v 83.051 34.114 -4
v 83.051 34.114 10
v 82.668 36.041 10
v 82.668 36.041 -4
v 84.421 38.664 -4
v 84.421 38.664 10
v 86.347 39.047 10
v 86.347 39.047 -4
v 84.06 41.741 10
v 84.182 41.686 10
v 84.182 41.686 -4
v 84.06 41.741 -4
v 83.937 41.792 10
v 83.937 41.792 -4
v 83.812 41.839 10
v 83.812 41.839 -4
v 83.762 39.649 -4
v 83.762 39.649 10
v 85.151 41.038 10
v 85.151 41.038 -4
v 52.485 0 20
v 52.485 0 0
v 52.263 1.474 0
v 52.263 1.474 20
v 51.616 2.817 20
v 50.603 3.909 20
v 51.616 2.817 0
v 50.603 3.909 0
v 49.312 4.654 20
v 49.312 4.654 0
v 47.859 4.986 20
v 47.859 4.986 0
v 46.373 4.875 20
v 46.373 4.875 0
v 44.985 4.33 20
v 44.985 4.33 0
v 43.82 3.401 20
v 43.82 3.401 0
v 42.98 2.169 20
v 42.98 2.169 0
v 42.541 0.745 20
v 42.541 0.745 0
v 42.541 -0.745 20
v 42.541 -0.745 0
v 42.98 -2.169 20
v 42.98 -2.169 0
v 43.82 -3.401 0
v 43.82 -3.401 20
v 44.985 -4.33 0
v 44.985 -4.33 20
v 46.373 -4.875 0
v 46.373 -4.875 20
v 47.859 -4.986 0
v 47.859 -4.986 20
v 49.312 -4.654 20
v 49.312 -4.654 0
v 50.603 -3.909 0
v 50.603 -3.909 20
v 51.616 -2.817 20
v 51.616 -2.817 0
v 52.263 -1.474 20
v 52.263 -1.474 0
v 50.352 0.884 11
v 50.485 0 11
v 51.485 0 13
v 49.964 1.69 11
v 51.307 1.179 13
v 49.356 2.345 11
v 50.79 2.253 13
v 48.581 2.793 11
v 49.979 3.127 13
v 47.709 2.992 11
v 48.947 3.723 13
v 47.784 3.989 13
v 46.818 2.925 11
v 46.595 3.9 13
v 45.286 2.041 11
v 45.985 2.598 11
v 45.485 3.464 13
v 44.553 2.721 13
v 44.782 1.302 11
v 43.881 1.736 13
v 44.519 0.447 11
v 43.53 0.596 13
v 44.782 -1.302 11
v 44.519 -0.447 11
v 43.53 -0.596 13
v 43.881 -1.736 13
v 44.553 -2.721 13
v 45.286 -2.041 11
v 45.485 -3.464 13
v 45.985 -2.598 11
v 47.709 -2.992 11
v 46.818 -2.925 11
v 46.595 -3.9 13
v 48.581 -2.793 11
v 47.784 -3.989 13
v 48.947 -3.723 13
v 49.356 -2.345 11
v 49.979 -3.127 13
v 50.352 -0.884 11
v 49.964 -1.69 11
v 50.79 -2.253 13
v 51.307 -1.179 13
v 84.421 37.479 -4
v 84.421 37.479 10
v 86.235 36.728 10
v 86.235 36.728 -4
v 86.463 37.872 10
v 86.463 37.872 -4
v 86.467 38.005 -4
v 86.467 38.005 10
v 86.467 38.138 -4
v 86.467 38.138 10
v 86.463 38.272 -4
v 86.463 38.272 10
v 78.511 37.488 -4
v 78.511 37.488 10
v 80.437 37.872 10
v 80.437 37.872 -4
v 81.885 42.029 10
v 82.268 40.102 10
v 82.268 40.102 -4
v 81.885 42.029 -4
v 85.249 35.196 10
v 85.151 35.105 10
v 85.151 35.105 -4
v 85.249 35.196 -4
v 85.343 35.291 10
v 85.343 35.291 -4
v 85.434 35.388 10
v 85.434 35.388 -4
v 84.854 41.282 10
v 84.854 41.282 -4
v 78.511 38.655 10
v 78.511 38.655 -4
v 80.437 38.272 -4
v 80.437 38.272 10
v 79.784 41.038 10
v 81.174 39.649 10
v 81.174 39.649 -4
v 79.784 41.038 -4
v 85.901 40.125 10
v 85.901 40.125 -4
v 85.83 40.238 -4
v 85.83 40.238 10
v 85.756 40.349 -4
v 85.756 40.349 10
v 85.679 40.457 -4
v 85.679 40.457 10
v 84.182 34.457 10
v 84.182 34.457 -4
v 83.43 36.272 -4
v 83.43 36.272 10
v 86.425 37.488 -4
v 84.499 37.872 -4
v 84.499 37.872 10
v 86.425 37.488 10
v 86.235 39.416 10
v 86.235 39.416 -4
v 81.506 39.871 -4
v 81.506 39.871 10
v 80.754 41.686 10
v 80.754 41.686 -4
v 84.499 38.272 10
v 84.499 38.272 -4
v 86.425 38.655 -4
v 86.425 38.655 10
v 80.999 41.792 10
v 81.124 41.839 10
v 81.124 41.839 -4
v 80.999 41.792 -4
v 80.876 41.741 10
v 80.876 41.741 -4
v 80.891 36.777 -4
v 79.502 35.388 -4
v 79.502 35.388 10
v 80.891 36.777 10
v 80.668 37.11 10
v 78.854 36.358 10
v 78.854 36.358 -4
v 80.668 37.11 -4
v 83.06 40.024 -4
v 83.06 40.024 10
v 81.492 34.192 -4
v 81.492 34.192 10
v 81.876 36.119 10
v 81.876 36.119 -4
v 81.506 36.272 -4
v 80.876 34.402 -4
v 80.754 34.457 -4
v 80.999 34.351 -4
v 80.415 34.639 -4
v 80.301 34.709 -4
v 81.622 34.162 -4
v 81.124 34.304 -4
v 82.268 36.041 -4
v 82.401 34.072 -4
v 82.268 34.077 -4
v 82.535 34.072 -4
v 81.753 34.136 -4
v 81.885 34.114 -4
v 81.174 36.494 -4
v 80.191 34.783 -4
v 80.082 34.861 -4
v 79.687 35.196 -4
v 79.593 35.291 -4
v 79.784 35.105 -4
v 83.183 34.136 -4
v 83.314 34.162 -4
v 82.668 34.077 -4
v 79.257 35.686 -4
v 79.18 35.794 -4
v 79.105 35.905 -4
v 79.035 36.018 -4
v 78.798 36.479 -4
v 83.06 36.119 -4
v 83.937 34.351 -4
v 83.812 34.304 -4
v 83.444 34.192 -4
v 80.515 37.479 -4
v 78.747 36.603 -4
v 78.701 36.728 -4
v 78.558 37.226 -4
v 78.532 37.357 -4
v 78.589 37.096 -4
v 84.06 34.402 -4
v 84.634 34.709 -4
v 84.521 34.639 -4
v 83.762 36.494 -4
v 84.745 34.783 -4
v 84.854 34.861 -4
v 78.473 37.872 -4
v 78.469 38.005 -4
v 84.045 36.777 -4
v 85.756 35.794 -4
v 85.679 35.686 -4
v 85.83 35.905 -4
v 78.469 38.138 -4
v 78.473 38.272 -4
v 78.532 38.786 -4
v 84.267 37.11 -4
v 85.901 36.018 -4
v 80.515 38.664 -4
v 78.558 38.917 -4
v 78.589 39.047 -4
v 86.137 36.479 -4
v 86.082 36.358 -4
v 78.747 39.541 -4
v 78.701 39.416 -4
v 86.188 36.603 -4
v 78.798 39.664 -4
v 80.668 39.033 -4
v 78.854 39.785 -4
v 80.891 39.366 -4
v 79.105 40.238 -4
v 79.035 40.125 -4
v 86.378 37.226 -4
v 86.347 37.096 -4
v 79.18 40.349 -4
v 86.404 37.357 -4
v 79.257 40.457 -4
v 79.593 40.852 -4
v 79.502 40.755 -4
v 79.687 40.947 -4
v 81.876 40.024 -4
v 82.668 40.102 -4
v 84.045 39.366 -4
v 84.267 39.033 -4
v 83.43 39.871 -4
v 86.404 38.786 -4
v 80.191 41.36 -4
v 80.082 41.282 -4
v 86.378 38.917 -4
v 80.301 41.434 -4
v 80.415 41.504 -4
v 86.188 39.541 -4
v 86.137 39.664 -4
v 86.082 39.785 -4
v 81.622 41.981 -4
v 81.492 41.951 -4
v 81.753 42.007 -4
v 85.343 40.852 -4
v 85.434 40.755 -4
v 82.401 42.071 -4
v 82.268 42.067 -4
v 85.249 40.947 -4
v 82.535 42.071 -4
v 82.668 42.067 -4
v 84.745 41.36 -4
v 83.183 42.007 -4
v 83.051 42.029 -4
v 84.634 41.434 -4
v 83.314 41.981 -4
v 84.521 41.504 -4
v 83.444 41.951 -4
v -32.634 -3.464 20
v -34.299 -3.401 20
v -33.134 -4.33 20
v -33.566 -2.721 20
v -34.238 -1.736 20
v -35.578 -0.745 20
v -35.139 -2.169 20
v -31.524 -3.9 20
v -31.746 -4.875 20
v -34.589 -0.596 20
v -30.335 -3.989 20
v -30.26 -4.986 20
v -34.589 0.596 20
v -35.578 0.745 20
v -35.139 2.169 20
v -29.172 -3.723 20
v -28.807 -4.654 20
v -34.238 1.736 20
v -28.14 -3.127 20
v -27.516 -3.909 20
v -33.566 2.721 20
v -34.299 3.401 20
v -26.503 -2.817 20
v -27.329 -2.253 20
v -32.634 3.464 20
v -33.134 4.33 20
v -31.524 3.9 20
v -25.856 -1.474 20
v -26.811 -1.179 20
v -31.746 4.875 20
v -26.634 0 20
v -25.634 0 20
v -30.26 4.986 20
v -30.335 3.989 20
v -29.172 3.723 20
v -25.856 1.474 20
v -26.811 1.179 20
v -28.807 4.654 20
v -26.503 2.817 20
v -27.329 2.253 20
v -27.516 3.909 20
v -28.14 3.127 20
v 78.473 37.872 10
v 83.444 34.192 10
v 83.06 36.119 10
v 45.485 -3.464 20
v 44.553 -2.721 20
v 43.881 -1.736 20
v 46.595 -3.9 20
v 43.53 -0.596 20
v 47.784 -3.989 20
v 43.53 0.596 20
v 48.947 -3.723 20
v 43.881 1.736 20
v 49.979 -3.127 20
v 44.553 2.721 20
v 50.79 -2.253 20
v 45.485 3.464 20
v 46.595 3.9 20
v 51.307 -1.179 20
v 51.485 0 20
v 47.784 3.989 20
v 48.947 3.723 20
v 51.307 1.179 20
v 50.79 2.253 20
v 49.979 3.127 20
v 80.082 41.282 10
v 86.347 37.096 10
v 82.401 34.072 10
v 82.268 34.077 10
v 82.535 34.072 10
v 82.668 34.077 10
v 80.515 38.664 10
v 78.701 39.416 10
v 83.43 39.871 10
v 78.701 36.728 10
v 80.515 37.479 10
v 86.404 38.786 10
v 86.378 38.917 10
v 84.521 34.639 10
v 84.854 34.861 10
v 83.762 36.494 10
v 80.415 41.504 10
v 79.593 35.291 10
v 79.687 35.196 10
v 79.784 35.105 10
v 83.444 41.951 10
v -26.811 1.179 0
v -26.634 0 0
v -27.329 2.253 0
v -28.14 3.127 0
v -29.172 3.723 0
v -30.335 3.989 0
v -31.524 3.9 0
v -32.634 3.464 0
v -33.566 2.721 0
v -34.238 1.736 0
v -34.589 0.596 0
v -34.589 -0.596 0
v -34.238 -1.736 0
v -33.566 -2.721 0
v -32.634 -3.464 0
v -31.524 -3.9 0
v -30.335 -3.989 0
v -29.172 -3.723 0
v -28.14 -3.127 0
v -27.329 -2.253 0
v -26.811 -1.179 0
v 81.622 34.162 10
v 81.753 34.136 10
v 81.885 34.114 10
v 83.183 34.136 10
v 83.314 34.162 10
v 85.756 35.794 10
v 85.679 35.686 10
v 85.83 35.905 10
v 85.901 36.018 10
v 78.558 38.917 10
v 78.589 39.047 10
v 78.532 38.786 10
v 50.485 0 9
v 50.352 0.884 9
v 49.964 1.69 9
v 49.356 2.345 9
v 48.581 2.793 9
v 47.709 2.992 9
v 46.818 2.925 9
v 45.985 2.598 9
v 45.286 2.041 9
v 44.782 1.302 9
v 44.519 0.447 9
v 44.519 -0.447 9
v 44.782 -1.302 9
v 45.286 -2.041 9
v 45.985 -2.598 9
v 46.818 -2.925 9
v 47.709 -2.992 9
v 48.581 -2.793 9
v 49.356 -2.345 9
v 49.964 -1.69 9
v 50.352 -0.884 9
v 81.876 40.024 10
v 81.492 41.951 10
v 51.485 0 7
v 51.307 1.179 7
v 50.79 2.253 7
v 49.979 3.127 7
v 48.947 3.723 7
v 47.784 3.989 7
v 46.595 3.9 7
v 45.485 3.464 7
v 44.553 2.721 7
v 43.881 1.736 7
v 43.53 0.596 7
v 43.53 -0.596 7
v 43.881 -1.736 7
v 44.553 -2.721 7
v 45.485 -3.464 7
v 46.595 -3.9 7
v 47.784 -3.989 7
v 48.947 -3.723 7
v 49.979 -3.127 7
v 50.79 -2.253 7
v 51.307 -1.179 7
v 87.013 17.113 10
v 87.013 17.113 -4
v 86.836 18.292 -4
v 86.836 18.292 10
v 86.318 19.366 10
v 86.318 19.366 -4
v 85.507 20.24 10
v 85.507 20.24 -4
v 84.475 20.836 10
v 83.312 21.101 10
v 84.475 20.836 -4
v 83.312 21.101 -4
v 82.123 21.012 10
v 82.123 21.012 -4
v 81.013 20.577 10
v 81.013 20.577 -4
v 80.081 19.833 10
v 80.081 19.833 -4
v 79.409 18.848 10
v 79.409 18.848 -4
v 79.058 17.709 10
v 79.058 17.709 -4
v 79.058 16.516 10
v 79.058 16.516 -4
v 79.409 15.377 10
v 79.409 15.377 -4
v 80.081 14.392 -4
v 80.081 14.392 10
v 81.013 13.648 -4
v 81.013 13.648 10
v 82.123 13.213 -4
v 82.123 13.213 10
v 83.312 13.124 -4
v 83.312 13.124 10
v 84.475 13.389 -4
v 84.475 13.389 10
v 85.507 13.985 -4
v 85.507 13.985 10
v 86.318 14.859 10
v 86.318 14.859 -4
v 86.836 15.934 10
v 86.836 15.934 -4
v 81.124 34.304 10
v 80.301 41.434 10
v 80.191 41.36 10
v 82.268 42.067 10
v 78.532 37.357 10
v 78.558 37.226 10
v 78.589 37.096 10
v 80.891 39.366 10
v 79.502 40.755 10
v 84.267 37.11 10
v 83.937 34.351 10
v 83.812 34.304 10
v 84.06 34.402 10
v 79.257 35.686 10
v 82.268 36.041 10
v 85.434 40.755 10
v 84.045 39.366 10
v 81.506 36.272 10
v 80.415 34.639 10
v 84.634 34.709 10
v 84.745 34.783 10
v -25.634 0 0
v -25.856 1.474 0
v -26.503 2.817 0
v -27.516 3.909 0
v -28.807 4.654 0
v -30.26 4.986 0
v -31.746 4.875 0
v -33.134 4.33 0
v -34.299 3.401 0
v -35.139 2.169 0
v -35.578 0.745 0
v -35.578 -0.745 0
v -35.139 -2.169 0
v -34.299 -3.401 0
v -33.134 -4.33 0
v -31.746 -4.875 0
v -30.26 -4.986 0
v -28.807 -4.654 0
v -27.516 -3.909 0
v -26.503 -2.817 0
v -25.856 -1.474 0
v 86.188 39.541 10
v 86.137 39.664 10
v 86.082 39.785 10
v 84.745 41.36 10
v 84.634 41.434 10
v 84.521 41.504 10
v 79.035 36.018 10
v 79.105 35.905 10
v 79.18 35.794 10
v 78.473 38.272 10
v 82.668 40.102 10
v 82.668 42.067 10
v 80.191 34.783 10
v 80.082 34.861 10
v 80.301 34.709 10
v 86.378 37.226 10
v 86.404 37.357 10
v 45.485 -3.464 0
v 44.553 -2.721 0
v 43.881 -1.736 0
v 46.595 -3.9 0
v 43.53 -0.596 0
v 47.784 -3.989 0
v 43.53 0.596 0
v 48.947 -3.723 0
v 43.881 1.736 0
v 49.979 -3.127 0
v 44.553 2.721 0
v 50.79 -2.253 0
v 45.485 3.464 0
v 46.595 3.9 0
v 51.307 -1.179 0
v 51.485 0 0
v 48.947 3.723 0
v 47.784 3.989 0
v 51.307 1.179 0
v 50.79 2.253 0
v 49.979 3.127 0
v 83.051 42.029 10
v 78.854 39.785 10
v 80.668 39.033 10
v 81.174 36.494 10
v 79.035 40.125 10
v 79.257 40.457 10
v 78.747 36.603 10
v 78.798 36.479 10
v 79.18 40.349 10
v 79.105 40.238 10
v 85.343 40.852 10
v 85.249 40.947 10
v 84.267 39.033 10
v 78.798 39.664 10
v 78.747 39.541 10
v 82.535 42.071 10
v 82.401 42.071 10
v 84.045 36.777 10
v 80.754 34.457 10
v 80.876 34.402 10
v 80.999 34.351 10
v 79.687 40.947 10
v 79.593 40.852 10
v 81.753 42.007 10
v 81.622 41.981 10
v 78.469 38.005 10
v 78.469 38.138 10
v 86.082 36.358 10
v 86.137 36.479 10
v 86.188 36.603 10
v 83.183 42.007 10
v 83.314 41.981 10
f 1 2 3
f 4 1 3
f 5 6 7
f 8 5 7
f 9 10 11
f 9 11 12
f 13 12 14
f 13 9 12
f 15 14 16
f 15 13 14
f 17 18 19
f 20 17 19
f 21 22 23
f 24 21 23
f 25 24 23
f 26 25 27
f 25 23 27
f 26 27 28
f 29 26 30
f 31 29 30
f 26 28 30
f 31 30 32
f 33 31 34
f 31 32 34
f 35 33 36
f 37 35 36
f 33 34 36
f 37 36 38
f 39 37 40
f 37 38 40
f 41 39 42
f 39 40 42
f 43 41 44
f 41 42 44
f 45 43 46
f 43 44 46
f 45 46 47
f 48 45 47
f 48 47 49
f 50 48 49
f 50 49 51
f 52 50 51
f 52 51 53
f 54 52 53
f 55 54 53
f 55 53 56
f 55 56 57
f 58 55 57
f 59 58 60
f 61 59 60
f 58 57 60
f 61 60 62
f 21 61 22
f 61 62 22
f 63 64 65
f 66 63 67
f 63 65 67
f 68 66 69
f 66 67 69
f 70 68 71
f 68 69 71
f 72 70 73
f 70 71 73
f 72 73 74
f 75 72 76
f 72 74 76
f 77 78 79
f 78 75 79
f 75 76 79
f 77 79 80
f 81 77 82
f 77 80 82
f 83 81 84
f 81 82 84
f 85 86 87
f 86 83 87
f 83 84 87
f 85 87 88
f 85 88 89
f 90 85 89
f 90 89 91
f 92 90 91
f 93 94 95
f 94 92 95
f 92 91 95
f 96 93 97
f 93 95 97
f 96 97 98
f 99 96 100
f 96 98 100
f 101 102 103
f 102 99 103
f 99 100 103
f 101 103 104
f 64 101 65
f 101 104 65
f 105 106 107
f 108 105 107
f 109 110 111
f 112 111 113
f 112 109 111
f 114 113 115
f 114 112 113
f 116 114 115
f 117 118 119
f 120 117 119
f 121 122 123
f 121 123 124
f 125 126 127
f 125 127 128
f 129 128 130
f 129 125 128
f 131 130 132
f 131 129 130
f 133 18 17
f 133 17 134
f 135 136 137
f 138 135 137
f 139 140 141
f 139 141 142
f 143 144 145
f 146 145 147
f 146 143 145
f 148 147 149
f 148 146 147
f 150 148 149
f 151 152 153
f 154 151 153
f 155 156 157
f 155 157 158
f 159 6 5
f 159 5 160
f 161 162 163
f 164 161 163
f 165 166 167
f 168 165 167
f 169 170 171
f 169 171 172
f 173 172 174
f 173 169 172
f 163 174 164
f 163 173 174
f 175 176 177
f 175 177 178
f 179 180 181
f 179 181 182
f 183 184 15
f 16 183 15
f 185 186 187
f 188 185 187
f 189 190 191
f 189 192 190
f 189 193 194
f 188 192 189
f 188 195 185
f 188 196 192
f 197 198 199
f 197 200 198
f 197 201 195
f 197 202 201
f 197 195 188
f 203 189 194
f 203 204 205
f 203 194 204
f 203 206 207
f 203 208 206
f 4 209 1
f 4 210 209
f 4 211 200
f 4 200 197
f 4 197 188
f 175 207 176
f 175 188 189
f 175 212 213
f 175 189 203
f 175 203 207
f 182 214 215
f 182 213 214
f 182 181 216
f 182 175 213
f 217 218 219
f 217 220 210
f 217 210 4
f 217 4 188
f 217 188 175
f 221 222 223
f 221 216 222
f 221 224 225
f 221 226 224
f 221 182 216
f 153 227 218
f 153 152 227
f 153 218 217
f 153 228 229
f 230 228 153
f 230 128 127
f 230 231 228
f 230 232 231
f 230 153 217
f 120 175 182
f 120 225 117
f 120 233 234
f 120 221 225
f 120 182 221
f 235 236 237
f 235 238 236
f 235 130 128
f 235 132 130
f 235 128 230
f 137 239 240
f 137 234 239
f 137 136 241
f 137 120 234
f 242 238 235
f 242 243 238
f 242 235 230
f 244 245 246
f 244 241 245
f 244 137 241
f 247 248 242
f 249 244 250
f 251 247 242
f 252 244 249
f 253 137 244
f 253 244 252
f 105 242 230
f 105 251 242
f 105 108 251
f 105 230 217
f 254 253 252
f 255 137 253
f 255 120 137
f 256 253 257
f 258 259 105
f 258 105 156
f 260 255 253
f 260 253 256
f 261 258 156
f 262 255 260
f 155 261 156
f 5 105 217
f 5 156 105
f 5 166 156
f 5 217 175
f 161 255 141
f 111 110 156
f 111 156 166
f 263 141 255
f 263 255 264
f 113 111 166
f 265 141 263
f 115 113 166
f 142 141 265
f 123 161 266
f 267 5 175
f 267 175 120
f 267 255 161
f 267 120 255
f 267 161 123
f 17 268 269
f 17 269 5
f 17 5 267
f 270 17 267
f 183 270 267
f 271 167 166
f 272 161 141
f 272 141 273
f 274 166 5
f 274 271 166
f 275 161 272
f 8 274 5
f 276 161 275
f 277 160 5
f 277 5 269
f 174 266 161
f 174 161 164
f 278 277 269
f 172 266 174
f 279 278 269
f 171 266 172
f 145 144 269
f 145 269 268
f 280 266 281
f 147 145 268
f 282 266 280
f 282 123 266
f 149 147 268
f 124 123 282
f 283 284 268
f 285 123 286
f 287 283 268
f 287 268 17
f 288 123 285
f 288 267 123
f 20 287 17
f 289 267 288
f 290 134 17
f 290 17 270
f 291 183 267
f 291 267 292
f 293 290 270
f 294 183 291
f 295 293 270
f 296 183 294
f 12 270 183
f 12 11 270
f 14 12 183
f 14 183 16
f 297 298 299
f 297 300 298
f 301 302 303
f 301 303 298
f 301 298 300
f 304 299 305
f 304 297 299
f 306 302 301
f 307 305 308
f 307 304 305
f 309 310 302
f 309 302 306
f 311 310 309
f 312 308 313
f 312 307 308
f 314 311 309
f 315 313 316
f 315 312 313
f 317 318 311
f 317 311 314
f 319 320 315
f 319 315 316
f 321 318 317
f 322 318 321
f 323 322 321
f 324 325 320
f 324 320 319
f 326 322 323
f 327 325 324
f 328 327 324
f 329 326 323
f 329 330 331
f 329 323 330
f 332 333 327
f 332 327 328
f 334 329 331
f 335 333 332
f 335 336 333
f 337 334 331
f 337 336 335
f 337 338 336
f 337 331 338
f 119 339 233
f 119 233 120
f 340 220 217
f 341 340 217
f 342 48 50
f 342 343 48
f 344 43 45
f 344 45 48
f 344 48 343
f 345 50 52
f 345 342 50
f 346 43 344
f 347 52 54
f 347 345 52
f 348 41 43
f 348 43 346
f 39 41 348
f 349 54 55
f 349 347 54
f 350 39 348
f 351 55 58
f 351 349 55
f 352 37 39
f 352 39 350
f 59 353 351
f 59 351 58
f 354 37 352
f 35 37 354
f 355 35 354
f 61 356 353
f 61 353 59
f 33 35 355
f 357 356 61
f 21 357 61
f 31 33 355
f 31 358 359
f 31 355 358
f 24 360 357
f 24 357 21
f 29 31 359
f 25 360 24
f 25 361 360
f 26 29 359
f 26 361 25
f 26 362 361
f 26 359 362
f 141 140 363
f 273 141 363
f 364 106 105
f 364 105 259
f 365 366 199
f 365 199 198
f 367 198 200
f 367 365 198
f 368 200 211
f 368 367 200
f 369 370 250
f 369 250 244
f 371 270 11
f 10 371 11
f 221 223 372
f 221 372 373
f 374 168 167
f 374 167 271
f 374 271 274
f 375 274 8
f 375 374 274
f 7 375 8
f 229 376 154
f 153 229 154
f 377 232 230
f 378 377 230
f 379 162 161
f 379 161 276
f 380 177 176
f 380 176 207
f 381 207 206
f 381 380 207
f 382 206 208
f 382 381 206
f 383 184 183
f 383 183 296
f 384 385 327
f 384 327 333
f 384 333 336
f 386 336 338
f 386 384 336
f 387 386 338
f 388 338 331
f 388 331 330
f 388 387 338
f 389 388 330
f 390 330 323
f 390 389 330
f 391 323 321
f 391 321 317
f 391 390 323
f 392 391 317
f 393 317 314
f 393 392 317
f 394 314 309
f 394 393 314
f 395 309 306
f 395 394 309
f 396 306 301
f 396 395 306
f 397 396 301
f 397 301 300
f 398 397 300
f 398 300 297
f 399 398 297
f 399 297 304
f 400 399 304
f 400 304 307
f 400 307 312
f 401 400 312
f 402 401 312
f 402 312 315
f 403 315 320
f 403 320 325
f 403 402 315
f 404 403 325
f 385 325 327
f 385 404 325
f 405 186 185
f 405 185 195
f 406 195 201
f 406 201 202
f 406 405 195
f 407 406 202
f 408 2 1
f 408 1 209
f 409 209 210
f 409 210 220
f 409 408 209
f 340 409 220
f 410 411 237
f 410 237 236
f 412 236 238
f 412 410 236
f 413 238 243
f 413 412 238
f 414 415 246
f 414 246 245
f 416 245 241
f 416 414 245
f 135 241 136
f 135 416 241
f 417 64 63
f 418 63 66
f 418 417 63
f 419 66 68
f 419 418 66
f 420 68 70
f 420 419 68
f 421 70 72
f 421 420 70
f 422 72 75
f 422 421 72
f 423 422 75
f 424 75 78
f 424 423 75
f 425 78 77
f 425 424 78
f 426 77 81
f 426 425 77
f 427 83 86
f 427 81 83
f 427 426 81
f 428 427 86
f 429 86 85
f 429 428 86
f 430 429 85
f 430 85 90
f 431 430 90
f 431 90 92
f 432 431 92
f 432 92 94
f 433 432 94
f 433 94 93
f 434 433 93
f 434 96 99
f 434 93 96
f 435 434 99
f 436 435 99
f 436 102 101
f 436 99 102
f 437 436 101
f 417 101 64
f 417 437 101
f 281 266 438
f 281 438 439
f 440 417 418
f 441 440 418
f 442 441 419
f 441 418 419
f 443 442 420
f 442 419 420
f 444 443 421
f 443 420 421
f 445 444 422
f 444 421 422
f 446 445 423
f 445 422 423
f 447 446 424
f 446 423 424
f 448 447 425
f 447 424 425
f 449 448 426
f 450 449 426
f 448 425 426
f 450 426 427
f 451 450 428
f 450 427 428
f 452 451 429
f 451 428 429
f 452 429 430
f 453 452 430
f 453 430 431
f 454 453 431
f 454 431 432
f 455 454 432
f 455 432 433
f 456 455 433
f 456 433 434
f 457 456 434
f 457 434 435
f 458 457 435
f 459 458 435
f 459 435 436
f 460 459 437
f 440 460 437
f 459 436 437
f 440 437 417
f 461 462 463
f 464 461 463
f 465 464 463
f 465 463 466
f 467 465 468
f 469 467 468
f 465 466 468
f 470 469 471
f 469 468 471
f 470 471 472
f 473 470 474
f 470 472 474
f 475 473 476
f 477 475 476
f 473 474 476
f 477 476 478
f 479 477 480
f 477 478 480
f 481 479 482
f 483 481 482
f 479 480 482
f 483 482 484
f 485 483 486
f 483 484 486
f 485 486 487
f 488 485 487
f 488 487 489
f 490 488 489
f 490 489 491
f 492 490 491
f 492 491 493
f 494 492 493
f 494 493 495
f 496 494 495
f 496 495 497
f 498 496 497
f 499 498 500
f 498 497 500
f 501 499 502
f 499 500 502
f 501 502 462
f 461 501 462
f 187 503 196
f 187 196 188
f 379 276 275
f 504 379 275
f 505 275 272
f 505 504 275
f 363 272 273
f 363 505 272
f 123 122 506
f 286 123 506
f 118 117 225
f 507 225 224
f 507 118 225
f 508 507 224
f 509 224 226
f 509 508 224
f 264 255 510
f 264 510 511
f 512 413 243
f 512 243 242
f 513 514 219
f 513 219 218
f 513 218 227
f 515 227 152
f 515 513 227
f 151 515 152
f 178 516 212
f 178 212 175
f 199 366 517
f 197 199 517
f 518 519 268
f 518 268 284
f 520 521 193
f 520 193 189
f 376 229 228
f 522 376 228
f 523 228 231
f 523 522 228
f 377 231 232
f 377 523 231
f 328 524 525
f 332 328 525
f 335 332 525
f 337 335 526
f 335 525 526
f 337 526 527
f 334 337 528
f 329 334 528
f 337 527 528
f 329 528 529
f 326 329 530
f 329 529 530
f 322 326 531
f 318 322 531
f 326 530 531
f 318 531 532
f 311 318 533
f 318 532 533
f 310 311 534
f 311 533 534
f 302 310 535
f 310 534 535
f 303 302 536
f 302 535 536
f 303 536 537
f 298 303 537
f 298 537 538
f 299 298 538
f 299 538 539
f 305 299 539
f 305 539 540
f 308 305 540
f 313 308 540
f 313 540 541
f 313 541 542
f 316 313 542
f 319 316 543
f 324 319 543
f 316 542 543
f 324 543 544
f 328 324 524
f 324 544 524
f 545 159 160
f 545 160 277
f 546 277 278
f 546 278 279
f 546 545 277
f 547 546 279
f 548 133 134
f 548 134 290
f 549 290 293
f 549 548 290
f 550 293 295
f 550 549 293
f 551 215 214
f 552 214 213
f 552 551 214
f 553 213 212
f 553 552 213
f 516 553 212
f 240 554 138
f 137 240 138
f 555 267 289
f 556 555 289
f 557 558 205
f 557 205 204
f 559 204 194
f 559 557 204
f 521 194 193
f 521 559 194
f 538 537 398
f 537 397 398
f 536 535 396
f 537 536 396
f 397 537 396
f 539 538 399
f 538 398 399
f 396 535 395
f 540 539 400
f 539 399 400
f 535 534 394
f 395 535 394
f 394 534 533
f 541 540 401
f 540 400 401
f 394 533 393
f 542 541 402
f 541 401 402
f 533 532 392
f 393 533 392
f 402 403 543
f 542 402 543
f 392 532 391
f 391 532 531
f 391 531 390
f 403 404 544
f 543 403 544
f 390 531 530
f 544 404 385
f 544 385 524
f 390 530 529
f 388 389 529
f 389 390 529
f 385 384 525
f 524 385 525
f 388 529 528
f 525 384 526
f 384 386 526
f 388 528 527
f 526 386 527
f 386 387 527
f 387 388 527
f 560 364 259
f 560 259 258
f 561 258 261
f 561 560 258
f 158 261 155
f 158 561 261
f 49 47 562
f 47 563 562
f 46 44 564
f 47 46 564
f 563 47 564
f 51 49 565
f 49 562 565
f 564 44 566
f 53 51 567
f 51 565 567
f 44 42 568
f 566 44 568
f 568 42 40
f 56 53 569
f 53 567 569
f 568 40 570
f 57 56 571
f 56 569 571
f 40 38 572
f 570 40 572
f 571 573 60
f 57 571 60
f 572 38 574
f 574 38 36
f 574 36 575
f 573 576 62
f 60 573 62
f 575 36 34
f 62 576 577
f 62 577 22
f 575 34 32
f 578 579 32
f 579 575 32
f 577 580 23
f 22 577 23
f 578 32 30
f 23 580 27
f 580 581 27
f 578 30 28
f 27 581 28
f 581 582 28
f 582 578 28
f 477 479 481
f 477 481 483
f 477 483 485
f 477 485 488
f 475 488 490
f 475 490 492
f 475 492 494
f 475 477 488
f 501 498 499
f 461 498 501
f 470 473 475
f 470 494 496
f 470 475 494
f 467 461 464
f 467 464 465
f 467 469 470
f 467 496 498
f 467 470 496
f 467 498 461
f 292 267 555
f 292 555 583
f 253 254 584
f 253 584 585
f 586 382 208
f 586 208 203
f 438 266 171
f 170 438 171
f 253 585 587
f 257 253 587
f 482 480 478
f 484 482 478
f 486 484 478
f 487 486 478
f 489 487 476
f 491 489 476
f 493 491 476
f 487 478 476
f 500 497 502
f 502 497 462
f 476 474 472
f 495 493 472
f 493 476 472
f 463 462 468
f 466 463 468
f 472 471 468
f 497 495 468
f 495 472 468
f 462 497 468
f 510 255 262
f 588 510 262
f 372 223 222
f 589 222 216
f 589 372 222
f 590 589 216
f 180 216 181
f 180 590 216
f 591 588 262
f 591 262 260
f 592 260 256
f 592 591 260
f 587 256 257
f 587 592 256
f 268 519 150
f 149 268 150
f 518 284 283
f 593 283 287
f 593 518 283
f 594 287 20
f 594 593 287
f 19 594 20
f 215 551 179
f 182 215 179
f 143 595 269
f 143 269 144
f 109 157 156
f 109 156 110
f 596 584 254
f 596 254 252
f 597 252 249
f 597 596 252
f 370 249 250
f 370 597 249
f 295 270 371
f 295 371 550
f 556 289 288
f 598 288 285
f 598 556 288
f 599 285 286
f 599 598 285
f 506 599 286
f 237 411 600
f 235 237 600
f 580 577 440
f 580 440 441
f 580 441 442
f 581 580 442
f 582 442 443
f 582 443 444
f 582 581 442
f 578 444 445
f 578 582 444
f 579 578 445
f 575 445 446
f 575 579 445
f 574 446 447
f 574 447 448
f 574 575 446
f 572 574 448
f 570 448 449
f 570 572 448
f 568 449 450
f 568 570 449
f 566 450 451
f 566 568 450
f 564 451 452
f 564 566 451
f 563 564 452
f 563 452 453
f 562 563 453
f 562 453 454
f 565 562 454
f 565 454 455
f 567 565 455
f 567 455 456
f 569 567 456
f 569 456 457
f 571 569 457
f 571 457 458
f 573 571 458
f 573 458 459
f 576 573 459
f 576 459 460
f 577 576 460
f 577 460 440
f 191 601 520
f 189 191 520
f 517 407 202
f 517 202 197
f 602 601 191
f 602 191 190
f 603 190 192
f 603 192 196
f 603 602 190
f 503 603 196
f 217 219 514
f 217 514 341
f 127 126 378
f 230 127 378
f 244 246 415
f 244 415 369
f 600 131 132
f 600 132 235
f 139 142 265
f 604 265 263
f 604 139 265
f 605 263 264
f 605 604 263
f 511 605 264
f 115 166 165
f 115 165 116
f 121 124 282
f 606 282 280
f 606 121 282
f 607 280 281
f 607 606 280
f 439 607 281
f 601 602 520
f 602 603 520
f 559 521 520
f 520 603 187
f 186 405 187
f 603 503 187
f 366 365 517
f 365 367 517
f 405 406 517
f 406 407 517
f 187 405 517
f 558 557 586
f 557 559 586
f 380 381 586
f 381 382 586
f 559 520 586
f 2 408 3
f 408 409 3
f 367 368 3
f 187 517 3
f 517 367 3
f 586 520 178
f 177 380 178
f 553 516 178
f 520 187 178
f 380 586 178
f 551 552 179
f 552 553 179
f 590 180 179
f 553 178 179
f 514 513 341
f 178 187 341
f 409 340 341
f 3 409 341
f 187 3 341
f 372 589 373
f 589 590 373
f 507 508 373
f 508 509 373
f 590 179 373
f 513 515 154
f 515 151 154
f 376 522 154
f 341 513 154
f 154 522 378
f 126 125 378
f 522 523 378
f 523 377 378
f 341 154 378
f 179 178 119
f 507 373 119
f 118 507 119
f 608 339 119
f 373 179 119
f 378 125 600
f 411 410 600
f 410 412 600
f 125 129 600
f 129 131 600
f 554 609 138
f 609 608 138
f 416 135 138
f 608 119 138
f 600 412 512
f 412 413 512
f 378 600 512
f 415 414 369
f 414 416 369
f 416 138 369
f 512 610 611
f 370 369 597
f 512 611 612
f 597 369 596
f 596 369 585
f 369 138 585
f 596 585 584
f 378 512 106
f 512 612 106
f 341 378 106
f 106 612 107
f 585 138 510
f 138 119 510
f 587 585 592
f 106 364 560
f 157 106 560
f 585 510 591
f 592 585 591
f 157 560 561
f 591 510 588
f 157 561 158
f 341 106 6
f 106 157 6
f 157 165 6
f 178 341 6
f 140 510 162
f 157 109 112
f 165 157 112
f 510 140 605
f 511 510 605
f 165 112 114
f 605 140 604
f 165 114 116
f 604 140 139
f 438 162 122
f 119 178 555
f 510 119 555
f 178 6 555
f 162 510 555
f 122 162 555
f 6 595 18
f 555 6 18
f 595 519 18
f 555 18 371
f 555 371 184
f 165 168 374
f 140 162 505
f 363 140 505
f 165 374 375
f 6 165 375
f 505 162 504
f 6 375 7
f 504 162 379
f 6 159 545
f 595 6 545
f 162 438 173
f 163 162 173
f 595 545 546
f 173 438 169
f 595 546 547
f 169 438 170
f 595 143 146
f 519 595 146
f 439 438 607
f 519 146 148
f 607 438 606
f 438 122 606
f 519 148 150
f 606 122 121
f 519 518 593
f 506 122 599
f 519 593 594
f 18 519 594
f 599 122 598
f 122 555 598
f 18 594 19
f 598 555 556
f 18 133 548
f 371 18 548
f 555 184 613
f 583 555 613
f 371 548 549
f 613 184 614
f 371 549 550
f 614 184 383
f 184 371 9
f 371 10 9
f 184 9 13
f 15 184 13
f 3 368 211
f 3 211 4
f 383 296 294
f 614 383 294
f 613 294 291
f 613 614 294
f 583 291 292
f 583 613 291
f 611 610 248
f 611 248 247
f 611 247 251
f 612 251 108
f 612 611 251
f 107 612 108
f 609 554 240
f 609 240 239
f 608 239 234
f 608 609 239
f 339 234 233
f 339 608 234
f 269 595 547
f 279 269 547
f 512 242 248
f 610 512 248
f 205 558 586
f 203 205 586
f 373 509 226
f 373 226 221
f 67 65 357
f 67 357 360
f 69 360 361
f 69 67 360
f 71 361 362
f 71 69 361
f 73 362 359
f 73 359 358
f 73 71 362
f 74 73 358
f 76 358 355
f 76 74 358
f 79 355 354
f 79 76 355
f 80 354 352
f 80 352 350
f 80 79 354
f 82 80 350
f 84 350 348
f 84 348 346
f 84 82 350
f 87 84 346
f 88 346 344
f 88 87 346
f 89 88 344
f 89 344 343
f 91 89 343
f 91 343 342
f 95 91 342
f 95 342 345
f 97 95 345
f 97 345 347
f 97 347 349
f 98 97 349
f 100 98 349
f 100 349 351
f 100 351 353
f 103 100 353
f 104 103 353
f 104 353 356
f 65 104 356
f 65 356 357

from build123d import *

# Parameters (mm, degrees)
CYLINDER_R                                     = 4
CYLINDER_DEPTH                                 = 14
TUBE_R                                         = 5
TUBE_R_2                                       = 4
TUBE_DEPTH                                     = 20
FACE_R                                         = 4
FACE_R_2                                       = 3
EXTRUSION_DEPTH                                = 2
CYLINDER002_R                                  = 3
CYLINDER002_DEPTH                              = 10
CYLINDER001_R                                  = 4
CYLINDER001_DEPTH                              = 4
TUBE001_R                                      = 5
TUBE001_R_2                                    = 4
TUBE001_DEPTH                                  = 20
CIRCLE_R                                       = 4
EXTRUSION017_DEPTH                             = 23.367784
CIRCLE001_R                                    = 11.743192
EXTRUSION018_DEPTH                             = 23.367784
RECTANGLE002_W                                 = 10
RECTANGLE002_H                                 = 0.4
EXTRUSION007_DEPTH                             = 14
RECTANGLE011_AS_DRAWN_W                        = 10
RECTANGLE011_AS_DRAWN_H                        = 0.4
EXTRUSION008_DEPTH                             = 14
EXTRUSION008_ONTO_RECTANGLE011_ROLL_ANGLE      = 180
EXTRUSION008_ONTO_RECTANGLE011_PLACEMENT_ANGLE = 78.75
RECTANGLE006_AS_DRAWN_W                        = 10
RECTANGLE006_AS_DRAWN_H                        = 0.4
EXTRUSION009_DEPTH                             = 14
EXTRUSION009_ONTO_RECTANGLE006_ROLL_ANGLE      = 180
EXTRUSION009_ONTO_RECTANGLE006_PLACEMENT_ANGLE = 67.5
RECTANGLE010_AS_DRAWN_W                        = 10
RECTANGLE010_AS_DRAWN_H                        = 0.4
EXTRUSION010_DEPTH                             = 14
EXTRUSION010_ONTO_RECTANGLE010_ROLL_ANGLE      = 180
EXTRUSION010_ONTO_RECTANGLE010_PLACEMENT_ANGLE = 56.25
RECTANGLE003_AS_DRAWN_W                        = 10
RECTANGLE003_AS_DRAWN_H                        = 0.4
EXTRUSION011_DEPTH                             = 14
EXTRUSION011_ONTO_RECTANGLE003_ROLL_ANGLE      = 180
EXTRUSION011_ONTO_RECTANGLE003_PLACEMENT_ANGLE = 45
RECTANGLE009_AS_DRAWN_W                        = 10
RECTANGLE009_AS_DRAWN_H                        = 0.4
EXTRUSION016_DEPTH                             = 14
EXTRUSION016_ONTO_RECTANGLE009_ROLL_ANGLE      = 180
EXTRUSION016_ONTO_RECTANGLE009_PLACEMENT_ANGLE = 33.75
RECTANGLE005_AS_DRAWN_W                        = 10
RECTANGLE005_AS_DRAWN_H                        = 0.4
EXTRUSION015_DEPTH                             = 14
EXTRUSION015_ONTO_RECTANGLE005_ROLL_ANGLE      = 180
EXTRUSION015_ONTO_RECTANGLE005_PLACEMENT_ANGLE = 22.5
RECTANGLE015_AS_DRAWN_W                        = 10
RECTANGLE015_AS_DRAWN_H                        = 0.4
EXTRUSION014_DEPTH                             = 14
EXTRUSION014_ONTO_RECTANGLE015_ROLL_ANGLE      = 180
EXTRUSION014_ONTO_RECTANGLE015_PLACEMENT_ANGLE = 11.25
RECTANGLE017_W                                 = 10
RECTANGLE017_H                                 = 0.4
EXTRUSION013_DEPTH                             = 14
RECTANGLE016_AS_DRAWN_W                        = 10
RECTANGLE016_AS_DRAWN_H                        = 0.4
EXTRUSION012_DEPTH                             = 14
EXTRUSION012_ONTO_RECTANGLE016_ROLL_ANGLE      = 180
EXTRUSION012_ONTO_RECTANGLE016_PLACEMENT_ANGLE = -11.25
RECTANGLE008_AS_DRAWN_W                        = 10
RECTANGLE008_AS_DRAWN_H                        = 0.4
EXTRUSION001_DEPTH                             = 14
EXTRUSION001_ONTO_RECTANGLE008_ROLL_ANGLE      = 180
EXTRUSION001_ONTO_RECTANGLE008_PLACEMENT_ANGLE = -22.5
RECTANGLE014_AS_DRAWN_W                        = 10
RECTANGLE014_AS_DRAWN_H                        = 0.4
EXTRUSION002_DEPTH                             = 14
EXTRUSION002_ONTO_RECTANGLE014_ROLL_ANGLE      = 180
EXTRUSION002_ONTO_RECTANGLE014_PLACEMENT_ANGLE = 146.25
RECTANGLE004_AS_DRAWN_W                        = 10
RECTANGLE004_AS_DRAWN_H                        = 0.4
EXTRUSION003_DEPTH                             = 14
EXTRUSION003_ONTO_RECTANGLE004_ROLL_ANGLE      = 180
EXTRUSION003_ONTO_RECTANGLE004_PLACEMENT_ANGLE = 135
RECTANGLE013_AS_DRAWN_W                        = 10
RECTANGLE013_AS_DRAWN_H                        = 0.4
EXTRUSION004_DEPTH                             = 14
EXTRUSION004_ONTO_RECTANGLE013_ROLL_ANGLE      = 180
EXTRUSION004_ONTO_RECTANGLE013_PLACEMENT_ANGLE = 123.75
RECTANGLE007_AS_DRAWN_W                        = 10
RECTANGLE007_AS_DRAWN_H                        = 0.4
EXTRUSION005_DEPTH                             = 14
EXTRUSION005_ONTO_RECTANGLE007_ROLL_ANGLE      = 180
EXTRUSION005_ONTO_RECTANGLE007_PLACEMENT_ANGLE = 112.5
RECTANGLE012_AS_DRAWN_W                        = 10
RECTANGLE012_AS_DRAWN_H                        = 0.4
EXTRUSION006_DEPTH                             = 14
EXTRUSION006_ONTO_RECTANGLE012_ROLL_ANGLE      = 180
EXTRUSION006_ONTO_RECTANGLE012_PLACEMENT_ANGLE = 101.25


with BuildPart() as cylinder:
    # Cylinder → Cylinder (new body)
    with BuildSketch(Plane(origin=(83.01326, 17.112599, -4), x_dir=(1, 0, 0), z_dir=(0, 0, 1))):
        Circle(CYLINDER_R)
    extrude(amount=CYLINDER_DEPTH)


with BuildPart() as tube:
    # Tube → Tube (new body)
    with BuildSketch(Plane(origin=(-30.633781, 0, 0), x_dir=(1, 0, 0), z_dir=(0, 0, 1))):
        Circle(TUBE_R)
        Circle(TUBE_R_2, mode=Mode.SUBTRACT)
    extrude(amount=TUBE_DEPTH)


with BuildPart() as cone:
    # Cone → Cone (revolve)
    with BuildSketch(Plane(origin=(25.92169, 0, 0), x_dir=(1, 0, 0), z_dir=(0, -1, 0))):
        Polygon((0, 0), (4, 0), (3, 2), (0, 2), align=None)
    revolve(axis=Axis((25.92169, 0, 0), (0, 0, 1)))


with BuildPart() as cone001:
    # Cone001 → Cone001 (revolve)
    with BuildSketch(Plane(origin=(25.92169, 0, 4), x_dir=(1, 0, 0), z_dir=(0, -1, 0))):
        Polygon((0, 0), (3, 0), (4, 2), (0, 2), align=None)
    revolve(axis=Axis((25.92169, 0, 4), (0, 0, 1)))


with BuildPart() as extrusion:
    # Face → Extrusion (new body)
    with BuildSketch(Plane(origin=(25.92169, 0, 4), x_dir=(0, 1, 0), z_dir=(0, 0, 1))):
        Circle(FACE_R)
        Circle(FACE_R_2, mode=Mode.SUBTRACT)
    extrude(amount=EXTRUSION_DEPTH)


with BuildPart() as cylinder002:
    # Cylinder002 → Cylinder002 (new body)
    with BuildSketch(Plane(origin=(25.92169, 0, 0), x_dir=(1, 0, 0), z_dir=(0, 0, 1))):
        Circle(CYLINDER002_R)
    extrude(amount=CYLINDER002_DEPTH)


with BuildPart() as cut002001:
    # Cylinder001 → Cylinder001 (new body)
    with BuildSketch(Plane(origin=(25.92169, 0, 0), x_dir=(1, 0, 0), z_dir=(0, 0, 1))):
        Circle(CYLINDER001_R)
    extrude(amount=CYLINDER001_DEPTH)

    # Cut: cut Cylinder002
    add(cylinder002.part, mode=Mode.SUBTRACT)

    # Fusion: union Extrusion
    add(extrusion.part)

    # Cut001: cut Cone001
    add(cone001.part, mode=Mode.SUBTRACT)

    # Cut002: cut Cone
    add(cone.part, mode=Mode.SUBTRACT)


with BuildPart() as cut002001_1:
    # Cut002001 placement: moved
    add(cut002001.part.moved(Location((21.563461, 0, 7))))


with BuildPart() as fusion001:
    # Tube001 → Tube001 (new body)
    with BuildSketch(Plane(origin=(47.485151, 0, 0), x_dir=(1, 0, 0), z_dir=(0, 0, 1))):
        Circle(TUBE001_R)
        Circle(TUBE001_R_2, mode=Mode.SUBTRACT)
    extrude(amount=TUBE001_DEPTH)

    # Fusion001: union Cut002001
    add(cut002001_1.part)


with BuildPart() as extrusion017:
    # Circle → Extrusion017 (new body)
    with BuildSketch(Plane(origin=(82.467959, 38.071618, 10), x_dir=(1, 0, 0), z_dir=(0, 0, 1))):
        Circle(CIRCLE_R)
    extrude(amount=-EXTRUSION017_DEPTH)


with BuildPart() as cut002002:
    # Circle001 → Extrusion018 (new body)
    with BuildSketch(Plane(origin=(82.467959, 38.071618, 10), x_dir=(1, 0, 0), z_dir=(0, 0, 1))):
        Circle(CIRCLE001_R)
    extrude(amount=-EXTRUSION018_DEPTH)

    # Cut002002: cut Extrusion017
    add(extrusion017.part, mode=Mode.SUBTRACT)


with BuildPart() as extrusion007:
    # Rectangle002 → Extrusion007 (new body)
    with BuildSketch(Plane(origin=(82.267959, 33.071618, 10), x_dir=(0, 1, 0), z_dir=(0, 0, -1))):
        with Locations((5, 0.2)):
            Rectangle(RECTANGLE002_W, RECTANGLE002_H)
    extrude(amount=EXTRUSION007_DEPTH)


with BuildPart() as extrusion008:
    # Rectangle011 as drawn → Extrusion008 (new)
    with BuildSketch(Plane.XY):
        with Locations((5, 0.2)):
            Rectangle(RECTANGLE011_AS_DRAWN_W, RECTANGLE011_AS_DRAWN_H)
    extrude(amount=EXTRUSION008_DEPTH)


with BuildPart() as extrusion008_1:
    # Extrusion008 onto Rectangle011 roll: moved
    add(extrusion008.part.rotate(Axis((0, 0, 0), (1, 0, 0)), EXTRUSION008_ONTO_RECTANGLE011_ROLL_ANGLE))


with BuildPart() as extrusion008_2:
    # Extrusion008 onto Rectangle011 placement: moved
    add(extrusion008_1.part.moved(Location((81.296351, 33.20671, 10))).rotate(Axis((81.296351, 33.20671, 10), (0, 0, 1)), EXTRUSION008_ONTO_RECTANGLE011_PLACEMENT_ANGLE))


with BuildPart() as extrusion009:
    # Rectangle006 as drawn → Extrusion009 (new)
    with BuildSketch(Plane.XY):
        with Locations((5, 0.2)):
            Rectangle(RECTANGLE006_AS_DRAWN_W, RECTANGLE006_AS_DRAWN_H)
    extrude(amount=EXTRUSION009_DEPTH)


with BuildPart() as extrusion009_1:
    # Extrusion009 onto Rectangle006 roll: moved
    add(extrusion009.part.rotate(Axis((0, 0, 0), (1, 0, 0)), EXTRUSION009_ONTO_RECTANGLE006_ROLL_ANGLE))


with BuildPart() as extrusion009_2:
    # Extrusion009 onto Rectangle006 placement: moved
    add(extrusion009_1.part.moved(Location((80.369766, 33.528757, 10))).rotate(Axis((80.369766, 33.528757, 10), (0, 0, 1)), EXTRUSION009_ONTO_RECTANGLE006_PLACEMENT_ANGLE))


with BuildPart() as extrusion010:
    # Rectangle010 as drawn → Extrusion010 (new)
    with BuildSketch(Plane.XY):
        with Locations((5, 0.2)):
            Rectangle(RECTANGLE010_AS_DRAWN_W, RECTANGLE010_AS_DRAWN_H)
    extrude(amount=EXTRUSION010_DEPTH)


with BuildPart() as extrusion010_1:
    # Extrusion010 onto Rectangle010 roll: moved
    add(extrusion010.part.rotate(Axis((0, 0, 0), (1, 0, 0)), EXTRUSION010_ONTO_RECTANGLE010_ROLL_ANGLE))


with BuildPart() as extrusion010_2:
    # Extrusion010 onto Rectangle010 placement: moved
    add(extrusion010_1.part.moved(Location((79.523814, 34.025384, 10))).rotate(Axis((79.523814, 34.025384, 10), (0, 0, 1)), EXTRUSION010_ONTO_RECTANGLE010_PLACEMENT_ANGLE))


with BuildPart() as extrusion011:
    # Rectangle003 as drawn → Extrusion011 (new)
    with BuildSketch(Plane.XY):
        with Locations((5, 0.2)):
            Rectangle(RECTANGLE003_AS_DRAWN_W, RECTANGLE003_AS_DRAWN_H)
    extrude(amount=EXTRUSION011_DEPTH)


with BuildPart() as extrusion011_1:
    # Extrusion011 onto Rectangle003 roll: moved
    add(extrusion011.part.rotate(Axis((0, 0, 0), (1, 0, 0)), EXTRUSION011_ONTO_RECTANGLE003_ROLL_ANGLE))


with BuildPart() as extrusion011_2:
    # Extrusion011 onto Rectangle003 placement: moved
    add(extrusion011_1.part.moved(Location((78.791004, 34.677505, 10))).rotate(Axis((78.791004, 34.677505, 10), (0, 0, 1)), EXTRUSION011_ONTO_RECTANGLE003_PLACEMENT_ANGLE))


with BuildPart() as extrusion016:
    # Rectangle009 as drawn → Extrusion016 (new)
    with BuildSketch(Plane.XY):
        with Locations((5, 0.2)):
            Rectangle(RECTANGLE009_AS_DRAWN_W, RECTANGLE009_AS_DRAWN_H)
    extrude(amount=EXTRUSION016_DEPTH)


with BuildPart() as extrusion016_1:
    # Extrusion016 onto Rectangle009 roll: moved
    add(extrusion016.part.rotate(Axis((0, 0, 0), (1, 0, 0)), EXTRUSION016_ONTO_RECTANGLE009_ROLL_ANGLE))


with BuildPart() as extrusion016_2:
    # Extrusion016 onto Rectangle009 placement: moved
    add(extrusion016_1.part.moved(Location((78.199497, 35.460061, 10))).rotate(Axis((78.199497, 35.460061, 10), (0, 0, 1)), EXTRUSION016_ONTO_RECTANGLE009_PLACEMENT_ANGLE))


with BuildPart() as extrusion015:
    # Rectangle005 as drawn → Extrusion015 (new)
    with BuildSketch(Plane.XY):
        with Locations((5, 0.2)):
            Rectangle(RECTANGLE005_AS_DRAWN_W, RECTANGLE005_AS_DRAWN_H)
    extrude(amount=EXTRUSION015_DEPTH)


with BuildPart() as extrusion015_1:
    # Extrusion015 onto Rectangle005 roll: moved
    add(extrusion015.part.rotate(Axis((0, 0, 0), (1, 0, 0)), EXTRUSION015_ONTO_RECTANGLE005_ROLL_ANGLE))


with BuildPart() as extrusion015_2:
    # Extrusion015 onto Rectangle005 placement: moved
    add(extrusion015_1.part.moved(Location((77.772025, 36.342977, 10))).rotate(Axis((77.772025, 36.342977, 10), (0, 0, 1)), EXTRUSION015_ONTO_RECTANGLE005_PLACEMENT_ANGLE))


with BuildPart() as extrusion014:
    # Rectangle015 as drawn → Extrusion014 (new)
    with BuildSketch(Plane.XY):
        with Locations((5, 0.2)):
            Rectangle(RECTANGLE015_AS_DRAWN_W, RECTANGLE015_AS_DRAWN_H)
    extrude(amount=EXTRUSION014_DEPTH)


with BuildPart() as extrusion014_1:
    # Extrusion014 onto Rectangle015 roll: moved
    add(extrusion014.part.rotate(Axis((0, 0, 0), (1, 0, 0)), EXTRUSION014_ONTO_RECTANGLE015_ROLL_ANGLE))


with BuildPart() as extrusion014_2:
    # Extrusion014 onto Rectangle015 placement: moved
    add(extrusion014_1.part.moved(Location((77.525015, 37.292323, 10))).rotate(Axis((77.525015, 37.292323, 10), (0, 0, 1)), EXTRUSION014_ONTO_RECTANGLE015_PLACEMENT_ANGLE))


with BuildPart() as extrusion013:
    # Rectangle017 → Extrusion013 (new body)
    with BuildSketch(Plane(origin=(77.467959, 38.271618, 10), x_dir=(1, 0, 0), z_dir=(0, 0, -1))):
        with Locations((5, 0.2)):
            Rectangle(RECTANGLE017_W, RECTANGLE017_H)
    extrude(amount=EXTRUSION013_DEPTH)


with BuildPart() as extrusion012:
    # Rectangle016 as drawn → Extrusion012 (new)
    with BuildSketch(Plane.XY):
        with Locations((5, 0.2)):
            Rectangle(RECTANGLE016_AS_DRAWN_W, RECTANGLE016_AS_DRAWN_H)
    extrude(amount=EXTRUSION012_DEPTH)


with BuildPart() as extrusion012_1:
    # Extrusion012 onto Rectangle016 roll: moved
    add(extrusion012.part.rotate(Axis((0, 0, 0), (1, 0, 0)), EXTRUSION012_ONTO_RECTANGLE016_ROLL_ANGLE))


with BuildPart() as extrusion012_2:
    # Extrusion012 onto Rectangle016 placement: moved
    add(extrusion012_1.part.moved(Location((77.603051, 39.243227, 10))).rotate(Axis((77.603051, 39.243227, 10), (0, 0, 1)), EXTRUSION012_ONTO_RECTANGLE016_PLACEMENT_ANGLE))


with BuildPart() as extrusion001:
    # Rectangle008 as drawn → Extrusion001 (new)
    with BuildSketch(Plane.XY):
        with Locations((5, 0.2)):
            Rectangle(RECTANGLE008_AS_DRAWN_W, RECTANGLE008_AS_DRAWN_H)
    extrude(amount=EXTRUSION001_DEPTH)


with BuildPart() as extrusion001_1:
    # Extrusion001 onto Rectangle008 roll: moved
    add(extrusion001.part.rotate(Axis((0, 0, 0), (1, 0, 0)), EXTRUSION001_ONTO_RECTANGLE008_ROLL_ANGLE))


with BuildPart() as extrusion001_2:
    # Extrusion001 onto Rectangle008 placement: moved
    add(extrusion001_1.part.moved(Location((77.925098, 40.169811, 10))).rotate(Axis((77.925098, 40.169811, 10), (0, 0, 1)), EXTRUSION001_ONTO_RECTANGLE008_PLACEMENT_ANGLE))


with BuildPart() as extrusion002:
    # Rectangle014 as drawn → Extrusion002 (new)
    with BuildSketch(Plane.XY):
        with Locations((5, 0.2)):
            Rectangle(RECTANGLE014_AS_DRAWN_W, RECTANGLE014_AS_DRAWN_H)
    extrude(amount=EXTRUSION002_DEPTH)


with BuildPart() as extrusion002_1:
    # Extrusion002 onto Rectangle014 roll: moved
    add(extrusion002.part.rotate(Axis((0, 0, 0), (1, 0, 0)), EXTRUSION002_ONTO_RECTANGLE014_ROLL_ANGLE))


with BuildPart() as extrusion002_2:
    # Extrusion002 onto Rectangle014 placement: moved
    add(extrusion002_1.part.moved(Location((86.514193, 35.127473, 10))).rotate(Axis((86.514193, 35.127473, 10), (0, 0, 1)), EXTRUSION002_ONTO_RECTANGLE014_PLACEMENT_ANGLE))


with BuildPart() as extrusion003:
    # Rectangle004 as drawn → Extrusion003 (new)
    with BuildSketch(Plane.XY):
        with Locations((5, 0.2)):
            Rectangle(RECTANGLE004_AS_DRAWN_W, RECTANGLE004_AS_DRAWN_H)
    extrude(amount=EXTRUSION003_DEPTH)


with BuildPart() as extrusion003_1:
    # Extrusion003 onto Rectangle004 roll: moved
    add(extrusion003.part.rotate(Axis((0, 0, 0), (1, 0, 0)), EXTRUSION003_ONTO_RECTANGLE004_ROLL_ANGLE))


with BuildPart() as extrusion003_2:
    # Extrusion003 onto Rectangle004 placement: moved
    add(extrusion003_1.part.moved(Location((85.862072, 34.394663, 10))).rotate(Axis((85.862072, 34.394663, 10), (0, 0, 1)), EXTRUSION003_ONTO_RECTANGLE004_PLACEMENT_ANGLE))


with BuildPart() as extrusion004:
    # Rectangle013 as drawn → Extrusion004 (new)
    with BuildSketch(Plane.XY):
        with Locations((5, 0.2)):
            Rectangle(RECTANGLE013_AS_DRAWN_W, RECTANGLE013_AS_DRAWN_H)
    extrude(amount=EXTRUSION004_DEPTH)


with BuildPart() as extrusion004_1:
    # Extrusion004 onto Rectangle013 roll: moved
    add(extrusion004.part.rotate(Axis((0, 0, 0), (1, 0, 0)), EXTRUSION004_ONTO_RECTANGLE013_ROLL_ANGLE))


with BuildPart() as extrusion004_2:
    # Extrusion004 onto Rectangle013 placement: moved
    add(extrusion004_1.part.moved(Location((85.079517, 33.803156, 10))).rotate(Axis((85.079517, 33.803156, 10), (0, 0, 1)), EXTRUSION004_ONTO_RECTANGLE013_PLACEMENT_ANGLE))


with BuildPart() as extrusion005:
    # Rectangle007 as drawn → Extrusion005 (new)
    with BuildSketch(Plane.XY):
        with Locations((5, 0.2)):
            Rectangle(RECTANGLE007_AS_DRAWN_W, RECTANGLE007_AS_DRAWN_H)
    extrude(amount=EXTRUSION005_DEPTH)


with BuildPart() as extrusion005_1:
    # Extrusion005 onto Rectangle007 roll: moved
    add(extrusion005.part.rotate(Axis((0, 0, 0), (1, 0, 0)), EXTRUSION005_ONTO_RECTANGLE007_ROLL_ANGLE))


with BuildPart() as extrusion005_2:
    # Extrusion005 onto Rectangle007 placement: moved
    add(extrusion005_1.part.moved(Location((84.196601, 33.375684, 10))).rotate(Axis((84.196601, 33.375684, 10), (0, 0, 1)), EXTRUSION005_ONTO_RECTANGLE007_PLACEMENT_ANGLE))


with BuildPart() as cut002003:
    # Rectangle012 as drawn → Extrusion006 (new)
    with BuildSketch(Plane.XY):
        with Locations((5, 0.2)):
            Rectangle(RECTANGLE012_AS_DRAWN_W, RECTANGLE012_AS_DRAWN_H)
    extrude(amount=EXTRUSION006_DEPTH)


with BuildPart() as cut002003_1:
    # Extrusion006 onto Rectangle012 roll: moved
    add(cut002003.part.rotate(Axis((0, 0, 0), (1, 0, 0)), EXTRUSION006_ONTO_RECTANGLE012_ROLL_ANGLE))


with BuildPart() as cut002003_2:
    # Extrusion006 onto Rectangle012 placement: moved
    add(cut002003_1.part.moved(Location((83.247254, 33.128673, 10))).rotate(Axis((83.247254, 33.128673, 10), (0, 0, 1)), EXTRUSION006_ONTO_RECTANGLE012_PLACEMENT_ANGLE))

    # Fusion002: union Extrusion007, Extrusion008, Extrusion009, Extrusion010, Extrusion011, Extrusion016, Extrusion015, Extrusion014, Extrusion013, Extrusion012, Extrusion001, Extrusion002, Extrusion003, Extrusion004, Extrusion005
    add(extrusion007.part)
    add(extrusion008_2.part)
    add(extrusion009_2.part)
    add(extrusion010_2.part)
    add(extrusion011_2.part)
    add(extrusion016_2.part)
    add(extrusion015_2.part)
    add(extrusion014_2.part)
    add(extrusion013.part)
    add(extrusion012_2.part)
    add(extrusion001_2.part)
    add(extrusion002_2.part)
    add(extrusion003_2.part)
    add(extrusion004_2.part)
    add(extrusion005_2.part)

    # Cut002003: cut Cut002002
    add(cut002002.part, mode=Mode.SUBTRACT)


solid = Compound([cylinder.part, tube.part, fusion001.part, cut002003_2.part])
